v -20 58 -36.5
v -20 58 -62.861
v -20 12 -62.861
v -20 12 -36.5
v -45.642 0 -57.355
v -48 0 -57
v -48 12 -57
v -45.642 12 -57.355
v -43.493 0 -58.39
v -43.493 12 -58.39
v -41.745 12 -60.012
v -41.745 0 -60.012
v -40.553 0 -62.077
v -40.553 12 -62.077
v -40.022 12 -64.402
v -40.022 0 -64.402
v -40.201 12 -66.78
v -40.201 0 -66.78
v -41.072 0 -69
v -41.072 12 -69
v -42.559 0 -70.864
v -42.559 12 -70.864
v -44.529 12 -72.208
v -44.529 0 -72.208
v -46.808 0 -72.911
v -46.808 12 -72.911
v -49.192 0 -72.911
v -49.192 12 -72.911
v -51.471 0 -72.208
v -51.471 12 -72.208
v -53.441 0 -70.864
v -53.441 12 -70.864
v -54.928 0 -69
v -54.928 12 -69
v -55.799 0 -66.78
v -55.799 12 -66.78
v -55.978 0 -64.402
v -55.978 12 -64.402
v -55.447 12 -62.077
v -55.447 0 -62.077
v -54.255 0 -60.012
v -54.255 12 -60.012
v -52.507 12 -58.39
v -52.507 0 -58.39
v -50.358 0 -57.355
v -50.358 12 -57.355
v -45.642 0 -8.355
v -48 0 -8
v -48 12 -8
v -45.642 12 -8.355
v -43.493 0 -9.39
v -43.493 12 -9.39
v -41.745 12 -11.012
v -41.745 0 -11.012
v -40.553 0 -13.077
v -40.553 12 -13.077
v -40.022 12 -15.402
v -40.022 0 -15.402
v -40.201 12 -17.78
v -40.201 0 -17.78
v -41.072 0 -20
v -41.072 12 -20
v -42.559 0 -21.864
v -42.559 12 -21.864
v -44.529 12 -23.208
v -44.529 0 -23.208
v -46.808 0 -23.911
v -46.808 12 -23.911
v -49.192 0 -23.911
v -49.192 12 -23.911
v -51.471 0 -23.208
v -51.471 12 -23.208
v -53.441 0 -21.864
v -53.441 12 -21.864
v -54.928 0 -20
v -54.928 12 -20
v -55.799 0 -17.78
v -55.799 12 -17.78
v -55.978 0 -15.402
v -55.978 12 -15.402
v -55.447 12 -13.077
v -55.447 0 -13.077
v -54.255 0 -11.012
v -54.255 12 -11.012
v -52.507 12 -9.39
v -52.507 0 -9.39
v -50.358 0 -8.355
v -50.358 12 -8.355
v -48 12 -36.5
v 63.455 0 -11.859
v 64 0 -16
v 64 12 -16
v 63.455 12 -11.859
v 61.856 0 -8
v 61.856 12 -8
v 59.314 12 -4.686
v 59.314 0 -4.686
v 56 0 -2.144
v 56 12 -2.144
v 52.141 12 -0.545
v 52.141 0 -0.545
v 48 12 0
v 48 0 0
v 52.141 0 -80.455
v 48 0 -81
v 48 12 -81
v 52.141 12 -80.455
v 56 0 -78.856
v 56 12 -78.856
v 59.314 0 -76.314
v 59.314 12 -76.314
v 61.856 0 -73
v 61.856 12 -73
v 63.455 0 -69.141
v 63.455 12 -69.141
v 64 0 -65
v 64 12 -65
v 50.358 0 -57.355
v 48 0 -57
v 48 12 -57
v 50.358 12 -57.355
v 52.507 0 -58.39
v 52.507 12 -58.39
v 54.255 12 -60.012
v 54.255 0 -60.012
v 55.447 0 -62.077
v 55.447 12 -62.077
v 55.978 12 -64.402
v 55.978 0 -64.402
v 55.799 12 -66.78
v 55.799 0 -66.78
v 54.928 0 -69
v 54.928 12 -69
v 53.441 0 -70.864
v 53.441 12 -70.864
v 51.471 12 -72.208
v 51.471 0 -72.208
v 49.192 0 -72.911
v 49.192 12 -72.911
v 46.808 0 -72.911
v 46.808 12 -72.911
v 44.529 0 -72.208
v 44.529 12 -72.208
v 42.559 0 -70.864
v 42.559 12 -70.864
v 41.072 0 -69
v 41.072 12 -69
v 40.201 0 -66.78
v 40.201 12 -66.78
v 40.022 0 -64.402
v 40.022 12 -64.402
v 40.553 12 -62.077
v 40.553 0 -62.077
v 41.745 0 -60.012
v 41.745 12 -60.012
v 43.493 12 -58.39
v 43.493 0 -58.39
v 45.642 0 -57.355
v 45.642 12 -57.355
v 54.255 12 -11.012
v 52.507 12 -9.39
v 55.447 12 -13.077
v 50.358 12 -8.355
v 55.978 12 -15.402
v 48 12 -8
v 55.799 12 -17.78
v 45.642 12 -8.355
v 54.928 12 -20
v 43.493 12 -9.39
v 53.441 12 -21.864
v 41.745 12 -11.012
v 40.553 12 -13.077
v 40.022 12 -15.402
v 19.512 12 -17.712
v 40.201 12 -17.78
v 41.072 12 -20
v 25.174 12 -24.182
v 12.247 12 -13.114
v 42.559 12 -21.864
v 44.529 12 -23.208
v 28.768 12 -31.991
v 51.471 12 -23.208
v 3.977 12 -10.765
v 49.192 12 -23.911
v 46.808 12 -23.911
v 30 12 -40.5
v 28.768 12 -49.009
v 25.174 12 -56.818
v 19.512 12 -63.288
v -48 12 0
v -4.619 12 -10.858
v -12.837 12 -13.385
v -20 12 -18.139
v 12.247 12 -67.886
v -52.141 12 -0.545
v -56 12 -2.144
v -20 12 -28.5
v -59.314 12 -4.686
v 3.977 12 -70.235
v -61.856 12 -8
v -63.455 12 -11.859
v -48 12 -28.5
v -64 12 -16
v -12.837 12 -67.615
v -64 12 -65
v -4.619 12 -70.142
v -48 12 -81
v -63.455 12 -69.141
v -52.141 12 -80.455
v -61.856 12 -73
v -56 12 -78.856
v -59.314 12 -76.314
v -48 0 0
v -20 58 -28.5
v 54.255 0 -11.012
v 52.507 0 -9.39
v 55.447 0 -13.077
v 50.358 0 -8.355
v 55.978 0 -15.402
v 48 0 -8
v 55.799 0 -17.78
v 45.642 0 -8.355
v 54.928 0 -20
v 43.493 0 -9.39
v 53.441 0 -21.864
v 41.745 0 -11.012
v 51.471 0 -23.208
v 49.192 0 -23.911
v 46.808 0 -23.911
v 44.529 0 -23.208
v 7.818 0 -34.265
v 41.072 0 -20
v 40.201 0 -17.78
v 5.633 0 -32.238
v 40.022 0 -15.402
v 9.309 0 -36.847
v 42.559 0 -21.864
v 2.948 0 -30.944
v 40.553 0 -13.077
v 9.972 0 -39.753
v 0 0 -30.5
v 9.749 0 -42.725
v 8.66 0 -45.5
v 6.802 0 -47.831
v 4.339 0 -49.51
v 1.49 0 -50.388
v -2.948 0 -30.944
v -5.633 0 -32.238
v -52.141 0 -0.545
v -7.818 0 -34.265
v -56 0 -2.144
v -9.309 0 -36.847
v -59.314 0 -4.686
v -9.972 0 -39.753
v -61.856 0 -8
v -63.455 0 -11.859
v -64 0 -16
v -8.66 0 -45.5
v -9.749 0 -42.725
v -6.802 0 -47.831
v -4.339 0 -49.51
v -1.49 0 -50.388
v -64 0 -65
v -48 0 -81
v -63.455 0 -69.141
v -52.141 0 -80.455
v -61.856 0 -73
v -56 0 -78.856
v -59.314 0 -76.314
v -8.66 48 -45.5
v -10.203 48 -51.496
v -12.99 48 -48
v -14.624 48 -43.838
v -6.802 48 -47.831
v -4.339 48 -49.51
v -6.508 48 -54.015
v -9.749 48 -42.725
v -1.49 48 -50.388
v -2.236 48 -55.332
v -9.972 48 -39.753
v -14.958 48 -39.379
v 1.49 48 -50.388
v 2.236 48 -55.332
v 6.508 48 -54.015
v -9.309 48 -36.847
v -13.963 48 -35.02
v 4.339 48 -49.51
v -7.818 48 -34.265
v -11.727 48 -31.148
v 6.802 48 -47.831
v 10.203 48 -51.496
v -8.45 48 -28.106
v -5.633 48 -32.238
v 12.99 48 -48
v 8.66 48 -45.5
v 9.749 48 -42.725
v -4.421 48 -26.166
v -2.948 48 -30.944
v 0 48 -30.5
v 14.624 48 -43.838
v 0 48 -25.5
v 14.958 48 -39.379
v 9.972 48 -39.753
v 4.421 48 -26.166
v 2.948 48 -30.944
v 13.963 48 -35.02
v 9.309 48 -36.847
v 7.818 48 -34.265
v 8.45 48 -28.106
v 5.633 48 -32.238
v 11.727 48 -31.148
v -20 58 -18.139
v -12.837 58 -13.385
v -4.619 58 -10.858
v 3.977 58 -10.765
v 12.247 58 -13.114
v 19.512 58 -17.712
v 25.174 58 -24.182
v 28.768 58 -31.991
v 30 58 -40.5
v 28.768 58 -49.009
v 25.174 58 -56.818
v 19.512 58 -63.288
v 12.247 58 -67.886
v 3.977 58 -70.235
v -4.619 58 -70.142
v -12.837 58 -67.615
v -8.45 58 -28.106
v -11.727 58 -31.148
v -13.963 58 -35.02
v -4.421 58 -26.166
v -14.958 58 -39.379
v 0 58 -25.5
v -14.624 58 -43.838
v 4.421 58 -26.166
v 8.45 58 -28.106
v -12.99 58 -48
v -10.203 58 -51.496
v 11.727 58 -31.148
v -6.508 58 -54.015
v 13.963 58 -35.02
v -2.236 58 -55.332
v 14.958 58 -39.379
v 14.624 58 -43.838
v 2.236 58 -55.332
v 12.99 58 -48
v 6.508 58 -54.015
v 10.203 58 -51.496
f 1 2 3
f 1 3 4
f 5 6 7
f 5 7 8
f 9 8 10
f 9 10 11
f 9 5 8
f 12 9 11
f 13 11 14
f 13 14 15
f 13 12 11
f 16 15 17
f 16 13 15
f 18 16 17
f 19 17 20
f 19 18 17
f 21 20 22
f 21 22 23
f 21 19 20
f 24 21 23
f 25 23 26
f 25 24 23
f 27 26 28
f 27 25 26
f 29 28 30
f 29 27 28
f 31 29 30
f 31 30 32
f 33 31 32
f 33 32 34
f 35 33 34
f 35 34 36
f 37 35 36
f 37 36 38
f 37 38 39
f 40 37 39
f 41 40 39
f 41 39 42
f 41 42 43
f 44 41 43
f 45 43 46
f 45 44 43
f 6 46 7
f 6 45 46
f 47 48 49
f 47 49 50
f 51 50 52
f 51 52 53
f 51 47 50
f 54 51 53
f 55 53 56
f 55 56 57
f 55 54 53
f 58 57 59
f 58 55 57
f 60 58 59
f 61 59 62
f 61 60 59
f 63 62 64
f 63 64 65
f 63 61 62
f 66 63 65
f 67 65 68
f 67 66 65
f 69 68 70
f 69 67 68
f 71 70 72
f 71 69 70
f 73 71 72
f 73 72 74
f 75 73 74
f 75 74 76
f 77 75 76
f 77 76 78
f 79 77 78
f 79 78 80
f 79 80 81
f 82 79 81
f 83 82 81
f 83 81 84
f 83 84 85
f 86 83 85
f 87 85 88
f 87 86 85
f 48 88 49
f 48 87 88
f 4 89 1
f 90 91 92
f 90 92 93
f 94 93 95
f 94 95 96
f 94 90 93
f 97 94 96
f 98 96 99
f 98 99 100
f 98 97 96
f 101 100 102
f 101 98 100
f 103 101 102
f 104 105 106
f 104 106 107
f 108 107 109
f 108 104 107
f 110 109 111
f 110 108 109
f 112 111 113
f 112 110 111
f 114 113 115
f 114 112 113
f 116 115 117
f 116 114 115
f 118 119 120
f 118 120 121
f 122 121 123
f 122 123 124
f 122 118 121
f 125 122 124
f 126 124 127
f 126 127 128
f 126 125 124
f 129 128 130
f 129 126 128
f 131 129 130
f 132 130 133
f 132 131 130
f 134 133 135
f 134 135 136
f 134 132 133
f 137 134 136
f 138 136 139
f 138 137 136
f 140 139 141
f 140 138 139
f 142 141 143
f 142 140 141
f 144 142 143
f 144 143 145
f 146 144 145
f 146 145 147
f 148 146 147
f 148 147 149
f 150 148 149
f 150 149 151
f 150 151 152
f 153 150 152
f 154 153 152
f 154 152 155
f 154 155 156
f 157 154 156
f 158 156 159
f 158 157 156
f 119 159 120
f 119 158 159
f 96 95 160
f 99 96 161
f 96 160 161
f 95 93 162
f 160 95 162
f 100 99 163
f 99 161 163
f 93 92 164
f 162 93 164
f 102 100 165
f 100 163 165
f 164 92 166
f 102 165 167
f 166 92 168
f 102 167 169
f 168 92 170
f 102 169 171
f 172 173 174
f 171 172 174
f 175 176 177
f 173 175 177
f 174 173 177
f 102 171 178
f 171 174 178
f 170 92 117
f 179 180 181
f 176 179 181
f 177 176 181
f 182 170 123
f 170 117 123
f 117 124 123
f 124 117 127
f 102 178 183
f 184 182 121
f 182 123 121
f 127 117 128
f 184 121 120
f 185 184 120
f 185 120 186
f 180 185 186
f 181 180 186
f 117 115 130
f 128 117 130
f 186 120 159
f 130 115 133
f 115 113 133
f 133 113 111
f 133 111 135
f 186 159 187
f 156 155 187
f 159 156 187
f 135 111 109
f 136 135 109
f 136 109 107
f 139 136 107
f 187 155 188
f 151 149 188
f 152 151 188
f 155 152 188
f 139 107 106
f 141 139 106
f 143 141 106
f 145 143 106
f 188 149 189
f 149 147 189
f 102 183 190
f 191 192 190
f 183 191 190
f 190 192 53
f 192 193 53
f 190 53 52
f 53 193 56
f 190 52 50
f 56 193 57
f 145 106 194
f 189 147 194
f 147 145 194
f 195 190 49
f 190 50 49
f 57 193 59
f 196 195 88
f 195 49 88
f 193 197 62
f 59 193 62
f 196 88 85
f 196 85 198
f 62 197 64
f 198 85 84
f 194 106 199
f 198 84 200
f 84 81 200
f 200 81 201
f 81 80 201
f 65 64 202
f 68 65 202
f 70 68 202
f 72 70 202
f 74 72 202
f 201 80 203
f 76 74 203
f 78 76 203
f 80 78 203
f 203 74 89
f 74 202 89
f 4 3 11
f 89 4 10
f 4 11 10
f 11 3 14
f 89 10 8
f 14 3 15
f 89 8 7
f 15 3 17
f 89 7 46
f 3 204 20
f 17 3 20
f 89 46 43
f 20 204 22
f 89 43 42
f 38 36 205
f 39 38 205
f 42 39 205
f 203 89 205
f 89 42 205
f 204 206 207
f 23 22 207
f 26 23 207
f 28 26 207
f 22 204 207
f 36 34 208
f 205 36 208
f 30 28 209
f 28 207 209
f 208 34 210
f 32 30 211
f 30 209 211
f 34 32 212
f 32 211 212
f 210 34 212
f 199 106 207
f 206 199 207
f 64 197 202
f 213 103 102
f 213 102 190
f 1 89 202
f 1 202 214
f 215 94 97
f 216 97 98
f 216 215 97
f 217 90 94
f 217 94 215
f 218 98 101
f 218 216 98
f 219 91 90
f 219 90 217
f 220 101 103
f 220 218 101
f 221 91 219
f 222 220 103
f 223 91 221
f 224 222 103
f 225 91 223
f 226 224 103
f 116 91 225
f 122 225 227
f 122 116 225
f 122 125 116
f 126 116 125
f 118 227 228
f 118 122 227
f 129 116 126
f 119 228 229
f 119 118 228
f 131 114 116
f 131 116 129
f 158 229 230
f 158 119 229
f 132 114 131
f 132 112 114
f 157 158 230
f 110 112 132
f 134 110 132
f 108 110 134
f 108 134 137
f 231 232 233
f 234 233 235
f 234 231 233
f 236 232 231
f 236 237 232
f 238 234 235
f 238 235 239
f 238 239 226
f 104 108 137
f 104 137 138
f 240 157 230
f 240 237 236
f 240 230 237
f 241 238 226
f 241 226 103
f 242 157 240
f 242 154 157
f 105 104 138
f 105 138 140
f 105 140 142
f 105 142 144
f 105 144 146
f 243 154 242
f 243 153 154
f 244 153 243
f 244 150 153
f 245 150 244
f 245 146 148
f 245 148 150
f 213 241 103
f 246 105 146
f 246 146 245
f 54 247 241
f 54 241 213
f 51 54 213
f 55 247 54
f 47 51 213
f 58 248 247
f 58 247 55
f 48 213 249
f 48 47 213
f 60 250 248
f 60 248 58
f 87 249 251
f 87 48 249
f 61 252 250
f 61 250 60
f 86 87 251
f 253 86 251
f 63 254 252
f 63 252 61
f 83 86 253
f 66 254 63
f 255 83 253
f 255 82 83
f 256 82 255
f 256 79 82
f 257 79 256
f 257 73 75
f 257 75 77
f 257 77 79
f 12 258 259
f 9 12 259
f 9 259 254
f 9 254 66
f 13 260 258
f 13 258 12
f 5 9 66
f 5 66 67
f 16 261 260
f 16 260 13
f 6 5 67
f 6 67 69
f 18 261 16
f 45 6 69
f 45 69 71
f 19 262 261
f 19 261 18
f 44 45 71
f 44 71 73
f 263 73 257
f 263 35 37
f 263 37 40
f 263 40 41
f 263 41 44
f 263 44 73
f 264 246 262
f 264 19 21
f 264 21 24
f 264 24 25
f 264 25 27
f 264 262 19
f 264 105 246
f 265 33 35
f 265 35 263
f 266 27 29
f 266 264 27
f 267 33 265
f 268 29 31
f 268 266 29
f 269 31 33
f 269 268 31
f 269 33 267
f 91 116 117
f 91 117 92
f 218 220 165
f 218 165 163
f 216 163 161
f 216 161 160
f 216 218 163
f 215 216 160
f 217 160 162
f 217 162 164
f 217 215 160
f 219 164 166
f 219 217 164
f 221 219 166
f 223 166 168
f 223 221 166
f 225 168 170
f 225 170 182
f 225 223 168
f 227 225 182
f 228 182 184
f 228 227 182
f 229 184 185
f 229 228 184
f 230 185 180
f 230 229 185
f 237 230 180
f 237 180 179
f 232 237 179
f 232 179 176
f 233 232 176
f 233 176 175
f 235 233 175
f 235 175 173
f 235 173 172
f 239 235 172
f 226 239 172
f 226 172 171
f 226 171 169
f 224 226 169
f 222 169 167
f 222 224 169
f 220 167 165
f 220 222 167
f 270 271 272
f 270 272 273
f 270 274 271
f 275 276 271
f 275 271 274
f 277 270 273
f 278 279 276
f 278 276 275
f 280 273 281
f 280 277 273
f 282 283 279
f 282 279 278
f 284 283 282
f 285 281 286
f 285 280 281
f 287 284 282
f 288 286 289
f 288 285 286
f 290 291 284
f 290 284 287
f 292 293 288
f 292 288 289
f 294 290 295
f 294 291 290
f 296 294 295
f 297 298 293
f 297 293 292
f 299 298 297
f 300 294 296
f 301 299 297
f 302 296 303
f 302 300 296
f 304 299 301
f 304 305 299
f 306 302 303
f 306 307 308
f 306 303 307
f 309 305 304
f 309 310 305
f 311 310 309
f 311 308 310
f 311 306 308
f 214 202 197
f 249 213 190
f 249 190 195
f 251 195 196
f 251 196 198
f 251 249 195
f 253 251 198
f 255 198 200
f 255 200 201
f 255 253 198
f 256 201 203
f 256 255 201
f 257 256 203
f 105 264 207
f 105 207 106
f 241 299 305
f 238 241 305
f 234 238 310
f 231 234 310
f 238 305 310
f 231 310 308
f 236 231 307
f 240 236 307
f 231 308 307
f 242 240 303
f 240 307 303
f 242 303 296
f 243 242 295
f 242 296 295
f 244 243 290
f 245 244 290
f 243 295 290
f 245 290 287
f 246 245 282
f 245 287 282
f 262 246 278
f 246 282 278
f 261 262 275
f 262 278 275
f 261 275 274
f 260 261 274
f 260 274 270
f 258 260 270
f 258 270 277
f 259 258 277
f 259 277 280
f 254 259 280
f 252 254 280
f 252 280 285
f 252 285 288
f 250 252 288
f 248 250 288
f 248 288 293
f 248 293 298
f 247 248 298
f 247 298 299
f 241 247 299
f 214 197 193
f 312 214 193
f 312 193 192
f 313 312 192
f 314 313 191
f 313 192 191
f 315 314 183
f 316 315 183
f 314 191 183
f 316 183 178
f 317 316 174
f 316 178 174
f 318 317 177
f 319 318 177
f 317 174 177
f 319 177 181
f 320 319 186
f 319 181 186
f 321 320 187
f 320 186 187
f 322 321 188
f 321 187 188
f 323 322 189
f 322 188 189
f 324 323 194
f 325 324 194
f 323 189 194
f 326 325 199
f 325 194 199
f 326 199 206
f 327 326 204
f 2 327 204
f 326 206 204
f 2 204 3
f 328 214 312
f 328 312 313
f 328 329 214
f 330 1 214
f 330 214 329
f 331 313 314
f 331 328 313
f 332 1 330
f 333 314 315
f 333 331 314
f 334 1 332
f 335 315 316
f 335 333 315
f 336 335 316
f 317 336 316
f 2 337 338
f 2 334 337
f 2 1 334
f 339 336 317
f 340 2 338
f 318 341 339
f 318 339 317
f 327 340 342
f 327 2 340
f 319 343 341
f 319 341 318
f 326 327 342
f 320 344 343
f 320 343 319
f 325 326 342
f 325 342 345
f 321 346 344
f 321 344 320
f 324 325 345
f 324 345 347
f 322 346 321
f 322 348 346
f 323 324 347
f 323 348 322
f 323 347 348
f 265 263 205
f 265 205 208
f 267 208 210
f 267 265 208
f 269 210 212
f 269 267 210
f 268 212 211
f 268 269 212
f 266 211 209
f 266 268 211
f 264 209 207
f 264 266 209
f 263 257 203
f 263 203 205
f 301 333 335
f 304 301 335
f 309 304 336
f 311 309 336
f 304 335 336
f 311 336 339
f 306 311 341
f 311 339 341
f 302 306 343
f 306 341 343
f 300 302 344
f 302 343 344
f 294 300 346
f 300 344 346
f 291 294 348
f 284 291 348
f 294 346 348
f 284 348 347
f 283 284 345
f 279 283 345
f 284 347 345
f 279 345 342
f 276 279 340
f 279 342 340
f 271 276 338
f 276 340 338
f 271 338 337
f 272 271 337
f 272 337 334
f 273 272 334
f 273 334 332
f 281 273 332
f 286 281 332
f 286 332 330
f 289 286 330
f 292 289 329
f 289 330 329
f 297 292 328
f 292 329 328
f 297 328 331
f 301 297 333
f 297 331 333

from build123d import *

# Parameters (mm, degrees)
IZIM1_R                     = 8
Y_KSEKLIK_EKSTR_ZYON1_DEPTH = 12
Y_KSEKLIK_EKSTR_ZYON2_DEPTH = 46
IZIM4_R                     = 15
KES_EKSTR_ZYON1_DEPTH       = 10
IZIM5_R                     = 10
KES_EKSTR_ZYON2_DEPTH       = 114.846387734
FEDER7_REACH                = 101.057
IZIM16_WALL_W               = 253.965251844
IZIM16_WALL_H               = 8


with BuildPart() as part:
    # Çizim1 → Yükseklik-Ekstrüzyon1 (new body)
    with BuildSketch(Plane(origin=(0, 0, 0), x_dir=(1, 0, 0), z_dir=(0, 1, 0))):
        with BuildLine():
            Line((48, 0), (-48, 0))
            ThreePointArc((-48, 0), (-59.313708499, 4.686291501), (-64, 16))
            Line((-64, 16), (-64, 49))
            Line((-64, 49), (-64, 65))
            ThreePointArc((-64, 65), (-59.313708499, 76.313708499), (-48, 81))
            Line((-48, 81), (48, 81))
            ThreePointArc((48, 81), (59.313708499, 76.313708499), (64, 65))
            Line((64, 65), (64, 49))
            Line((64, 49), (64, 16))
            ThreePointArc((64, 16), (59.313708499, 4.686291501), (48, 0))
        make_face()
        with Locations(Location((-48, 65, 0), (0, 0, 270))):
            Circle(IZIM1_R, mode=Mode.SUBTRACT)
        with Locations(Location((-48, 16, 0), (0, 0, 270))):
            Circle(IZIM1_R, mode=Mode.SUBTRACT)
        with Locations(Location((48, 65, 0), (0, 0, 270))):
            Circle(IZIM1_R, mode=Mode.SUBTRACT)
        with Locations(Location((48, 16, 0), (0, 0, 270))):
            Circle(IZIM1_R, mode=Mode.SUBTRACT)
    extrude(amount=Y_KSEKLIK_EKSTR_ZYON1_DEPTH)

    # Çizim2 → Yükseklik-Ekstrüzyon2 (add)
    with BuildSketch(Plane(origin=(0, 12, 0), x_dir=(1, 0, 0), z_dir=(0, 1, 0))):
        with BuildLine():
            Line((-20, 62.860679775), (-20, 40.5))
            Line((-20, 40.5), (-20, 18.139320225))
            ThreePointArc((-20, 18.139320225), (30, 40.5), (-20, 62.860679775))
        make_face()
    extrude(amount=Y_KSEKLIK_EKSTR_ZYON2_DEPTH)

    # Çizim4 → Kes-Ekstrüzyon1 (cut)
    with BuildSketch(Plane(origin=(0, 58, 0), x_dir=(1, 0, 0), z_dir=(0, 1, 0))):
        with Locations(Location((0, 40.5, 0), (0, 0, 270))):
            Circle(IZIM4_R)
    extrude(amount=-KES_EKSTR_ZYON1_DEPTH, mode=Mode.SUBTRACT)

    # Çizim5 → Kes-Ekstrüzyon2 (cut, through all)
    with BuildSketch(Plane(origin=(0, 48, 0), x_dir=(1, 0, 0), z_dir=(0, 1, 0))):
        with Locations(Location((0, 40.5, 0), (0, 0, 270))):
            Circle(IZIM5_R)
    extrude(amount=-KES_EKSTR_ZYON2_DEPTH, mode=Mode.SUBTRACT)

    # Çizim16 wall → Feder7 (add, up to next)
    with BuildSketch(Plane(origin=(-34, 35, -32.5), x_dir=(0.519946946896, 0.854198555614, 0), z_dir=(-0.854198555614, 0.519946946896, 0)), mode=Mode.PRIVATE) as feder7_sk1:
        Rectangle(IZIM16_WALL_W, IZIM16_WALL_H)
    feder7_tool1 = extrude(feder7_sk1.sketch, amount=-FEDER7_REACH, mode=Mode.PRIVATE) - part.part
    add(feder7_tool1.solids().sort_by_distance((-34, 35, -32.5))[0])


solid = part.part
